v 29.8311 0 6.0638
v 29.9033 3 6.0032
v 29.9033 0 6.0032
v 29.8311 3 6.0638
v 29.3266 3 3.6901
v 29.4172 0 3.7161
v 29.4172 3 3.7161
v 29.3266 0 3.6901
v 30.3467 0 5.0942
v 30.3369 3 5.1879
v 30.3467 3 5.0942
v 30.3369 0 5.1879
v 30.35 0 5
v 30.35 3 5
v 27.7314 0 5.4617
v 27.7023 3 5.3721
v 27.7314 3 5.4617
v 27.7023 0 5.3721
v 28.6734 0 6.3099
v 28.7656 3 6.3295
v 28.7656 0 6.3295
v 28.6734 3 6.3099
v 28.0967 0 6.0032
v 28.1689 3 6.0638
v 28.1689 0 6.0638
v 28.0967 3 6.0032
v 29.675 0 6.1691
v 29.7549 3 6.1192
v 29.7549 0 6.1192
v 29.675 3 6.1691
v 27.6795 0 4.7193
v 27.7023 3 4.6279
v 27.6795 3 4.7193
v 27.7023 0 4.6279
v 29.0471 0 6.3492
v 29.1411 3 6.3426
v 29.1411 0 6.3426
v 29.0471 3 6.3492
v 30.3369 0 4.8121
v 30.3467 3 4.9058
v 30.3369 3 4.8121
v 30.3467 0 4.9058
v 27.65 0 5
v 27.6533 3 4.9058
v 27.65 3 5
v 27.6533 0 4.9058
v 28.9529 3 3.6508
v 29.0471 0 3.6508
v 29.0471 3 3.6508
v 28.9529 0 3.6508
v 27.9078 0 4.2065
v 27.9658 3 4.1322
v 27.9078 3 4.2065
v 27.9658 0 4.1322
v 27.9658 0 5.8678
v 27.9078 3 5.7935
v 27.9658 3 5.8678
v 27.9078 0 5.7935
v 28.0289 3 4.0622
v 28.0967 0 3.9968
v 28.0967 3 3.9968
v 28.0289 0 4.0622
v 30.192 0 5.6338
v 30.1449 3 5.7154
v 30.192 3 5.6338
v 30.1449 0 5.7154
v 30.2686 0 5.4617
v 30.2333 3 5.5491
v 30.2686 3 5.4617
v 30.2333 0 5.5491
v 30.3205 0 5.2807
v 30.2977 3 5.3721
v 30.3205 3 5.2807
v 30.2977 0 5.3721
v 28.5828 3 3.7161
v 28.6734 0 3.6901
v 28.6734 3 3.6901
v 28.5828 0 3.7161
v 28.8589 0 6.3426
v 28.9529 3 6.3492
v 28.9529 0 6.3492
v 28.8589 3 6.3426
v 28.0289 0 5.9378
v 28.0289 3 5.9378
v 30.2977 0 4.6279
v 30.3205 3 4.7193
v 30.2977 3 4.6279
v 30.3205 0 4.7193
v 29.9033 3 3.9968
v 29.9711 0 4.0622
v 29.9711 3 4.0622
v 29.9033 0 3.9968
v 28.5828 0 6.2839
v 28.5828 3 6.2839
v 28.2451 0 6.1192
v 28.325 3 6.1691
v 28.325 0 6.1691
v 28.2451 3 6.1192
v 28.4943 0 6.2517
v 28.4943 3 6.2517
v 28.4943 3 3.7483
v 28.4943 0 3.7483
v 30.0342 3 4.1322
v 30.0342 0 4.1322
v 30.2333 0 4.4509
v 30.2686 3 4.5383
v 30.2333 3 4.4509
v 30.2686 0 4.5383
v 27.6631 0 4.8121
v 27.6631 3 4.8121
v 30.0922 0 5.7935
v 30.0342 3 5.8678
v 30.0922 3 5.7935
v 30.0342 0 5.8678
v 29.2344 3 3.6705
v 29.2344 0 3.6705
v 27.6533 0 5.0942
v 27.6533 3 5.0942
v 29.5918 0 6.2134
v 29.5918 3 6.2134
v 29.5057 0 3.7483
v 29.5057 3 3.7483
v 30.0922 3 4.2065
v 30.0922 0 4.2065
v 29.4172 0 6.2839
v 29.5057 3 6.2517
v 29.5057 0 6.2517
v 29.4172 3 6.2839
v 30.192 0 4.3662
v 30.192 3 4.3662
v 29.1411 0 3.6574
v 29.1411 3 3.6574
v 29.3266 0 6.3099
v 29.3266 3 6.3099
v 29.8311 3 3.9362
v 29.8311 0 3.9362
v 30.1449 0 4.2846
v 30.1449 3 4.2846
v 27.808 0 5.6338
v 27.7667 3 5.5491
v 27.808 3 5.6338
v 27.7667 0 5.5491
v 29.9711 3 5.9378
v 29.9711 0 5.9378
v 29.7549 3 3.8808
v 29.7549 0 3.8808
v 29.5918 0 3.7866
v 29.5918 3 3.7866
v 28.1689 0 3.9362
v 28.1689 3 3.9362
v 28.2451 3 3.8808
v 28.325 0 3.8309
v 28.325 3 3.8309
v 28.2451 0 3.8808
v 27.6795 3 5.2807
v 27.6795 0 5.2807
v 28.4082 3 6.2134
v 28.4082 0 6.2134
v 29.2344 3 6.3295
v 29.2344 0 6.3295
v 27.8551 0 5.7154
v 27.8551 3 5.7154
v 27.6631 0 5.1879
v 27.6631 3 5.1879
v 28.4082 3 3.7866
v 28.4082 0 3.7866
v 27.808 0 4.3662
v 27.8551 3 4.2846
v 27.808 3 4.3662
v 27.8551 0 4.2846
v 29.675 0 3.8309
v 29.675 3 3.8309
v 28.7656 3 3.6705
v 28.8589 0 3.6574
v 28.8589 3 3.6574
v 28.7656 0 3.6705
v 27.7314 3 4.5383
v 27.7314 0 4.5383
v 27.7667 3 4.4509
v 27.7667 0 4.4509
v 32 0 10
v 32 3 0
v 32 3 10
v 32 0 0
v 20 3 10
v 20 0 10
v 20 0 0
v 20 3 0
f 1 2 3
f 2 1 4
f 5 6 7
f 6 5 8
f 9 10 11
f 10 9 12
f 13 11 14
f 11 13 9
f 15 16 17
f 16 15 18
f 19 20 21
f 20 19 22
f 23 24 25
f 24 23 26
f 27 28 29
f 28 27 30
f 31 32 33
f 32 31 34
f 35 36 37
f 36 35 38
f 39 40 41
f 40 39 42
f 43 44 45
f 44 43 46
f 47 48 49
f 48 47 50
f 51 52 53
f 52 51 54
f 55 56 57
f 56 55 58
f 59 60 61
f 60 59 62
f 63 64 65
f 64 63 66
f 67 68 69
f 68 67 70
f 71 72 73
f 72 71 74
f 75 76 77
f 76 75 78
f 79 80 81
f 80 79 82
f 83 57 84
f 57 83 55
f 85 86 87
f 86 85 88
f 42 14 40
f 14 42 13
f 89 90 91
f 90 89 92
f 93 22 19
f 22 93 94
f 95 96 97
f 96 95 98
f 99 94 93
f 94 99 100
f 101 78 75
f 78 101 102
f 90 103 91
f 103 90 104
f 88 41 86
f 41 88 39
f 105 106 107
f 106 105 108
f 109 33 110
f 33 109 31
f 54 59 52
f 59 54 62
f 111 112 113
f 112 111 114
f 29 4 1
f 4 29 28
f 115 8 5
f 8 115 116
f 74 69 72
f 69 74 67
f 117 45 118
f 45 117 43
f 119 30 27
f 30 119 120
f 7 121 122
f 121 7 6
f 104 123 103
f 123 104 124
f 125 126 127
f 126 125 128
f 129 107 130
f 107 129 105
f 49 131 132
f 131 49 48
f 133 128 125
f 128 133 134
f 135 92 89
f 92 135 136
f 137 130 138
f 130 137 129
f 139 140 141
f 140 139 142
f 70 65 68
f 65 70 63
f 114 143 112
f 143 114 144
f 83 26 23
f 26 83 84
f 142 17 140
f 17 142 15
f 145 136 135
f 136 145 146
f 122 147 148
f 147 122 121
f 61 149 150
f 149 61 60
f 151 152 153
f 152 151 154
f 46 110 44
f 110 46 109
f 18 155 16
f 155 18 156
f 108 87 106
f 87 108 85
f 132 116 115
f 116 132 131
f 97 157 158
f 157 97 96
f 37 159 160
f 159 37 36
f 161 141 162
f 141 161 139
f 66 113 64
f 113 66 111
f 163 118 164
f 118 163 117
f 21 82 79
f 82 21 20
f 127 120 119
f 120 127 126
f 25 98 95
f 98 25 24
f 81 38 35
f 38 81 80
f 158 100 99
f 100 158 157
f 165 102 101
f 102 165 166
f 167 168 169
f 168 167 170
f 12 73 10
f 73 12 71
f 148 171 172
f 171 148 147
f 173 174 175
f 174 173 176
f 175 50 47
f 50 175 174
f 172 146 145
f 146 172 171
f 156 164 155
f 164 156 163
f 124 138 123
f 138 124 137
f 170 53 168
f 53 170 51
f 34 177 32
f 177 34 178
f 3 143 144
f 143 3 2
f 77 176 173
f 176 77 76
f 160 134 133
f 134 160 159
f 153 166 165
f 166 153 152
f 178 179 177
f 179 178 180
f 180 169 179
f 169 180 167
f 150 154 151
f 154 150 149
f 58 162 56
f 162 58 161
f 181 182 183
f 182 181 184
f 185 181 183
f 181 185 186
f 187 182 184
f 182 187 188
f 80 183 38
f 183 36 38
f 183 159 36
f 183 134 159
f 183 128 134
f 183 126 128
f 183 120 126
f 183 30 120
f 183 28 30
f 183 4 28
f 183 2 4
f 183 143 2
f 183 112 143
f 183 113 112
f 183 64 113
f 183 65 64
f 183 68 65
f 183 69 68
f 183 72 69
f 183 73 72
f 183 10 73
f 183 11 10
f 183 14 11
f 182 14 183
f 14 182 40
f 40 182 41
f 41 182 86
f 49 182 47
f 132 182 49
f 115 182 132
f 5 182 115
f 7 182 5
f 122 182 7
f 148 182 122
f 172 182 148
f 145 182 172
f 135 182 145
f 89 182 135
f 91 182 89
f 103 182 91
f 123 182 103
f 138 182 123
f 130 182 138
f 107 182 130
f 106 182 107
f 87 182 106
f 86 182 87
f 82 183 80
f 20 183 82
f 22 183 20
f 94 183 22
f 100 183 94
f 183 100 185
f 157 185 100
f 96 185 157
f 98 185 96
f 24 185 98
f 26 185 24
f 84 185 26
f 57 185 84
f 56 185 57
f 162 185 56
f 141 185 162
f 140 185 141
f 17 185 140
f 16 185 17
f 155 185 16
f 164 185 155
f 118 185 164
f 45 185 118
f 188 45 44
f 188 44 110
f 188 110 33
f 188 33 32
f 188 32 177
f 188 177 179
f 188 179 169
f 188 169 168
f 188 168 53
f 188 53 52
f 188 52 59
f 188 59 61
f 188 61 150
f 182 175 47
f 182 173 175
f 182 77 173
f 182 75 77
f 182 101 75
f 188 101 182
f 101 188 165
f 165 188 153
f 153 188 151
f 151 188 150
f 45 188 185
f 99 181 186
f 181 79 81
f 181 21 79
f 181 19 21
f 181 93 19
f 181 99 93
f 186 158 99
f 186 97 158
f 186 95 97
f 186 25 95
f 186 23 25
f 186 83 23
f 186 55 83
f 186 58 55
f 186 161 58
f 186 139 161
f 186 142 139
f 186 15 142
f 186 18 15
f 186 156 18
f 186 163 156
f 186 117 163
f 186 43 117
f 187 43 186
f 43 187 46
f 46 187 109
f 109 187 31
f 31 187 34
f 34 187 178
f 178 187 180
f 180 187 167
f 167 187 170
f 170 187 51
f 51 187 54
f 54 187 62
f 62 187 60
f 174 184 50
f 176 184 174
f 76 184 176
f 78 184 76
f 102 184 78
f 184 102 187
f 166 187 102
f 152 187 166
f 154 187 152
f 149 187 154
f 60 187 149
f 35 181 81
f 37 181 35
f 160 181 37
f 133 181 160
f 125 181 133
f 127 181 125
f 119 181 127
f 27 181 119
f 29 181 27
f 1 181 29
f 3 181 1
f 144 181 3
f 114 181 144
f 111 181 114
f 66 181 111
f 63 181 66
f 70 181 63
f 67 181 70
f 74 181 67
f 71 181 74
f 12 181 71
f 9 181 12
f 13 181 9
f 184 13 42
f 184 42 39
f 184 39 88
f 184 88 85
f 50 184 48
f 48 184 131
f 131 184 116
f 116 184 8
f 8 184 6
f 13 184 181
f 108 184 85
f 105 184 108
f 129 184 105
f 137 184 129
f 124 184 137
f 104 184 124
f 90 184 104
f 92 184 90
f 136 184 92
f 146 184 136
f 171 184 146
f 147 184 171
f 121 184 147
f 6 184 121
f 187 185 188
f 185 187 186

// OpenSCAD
// file: modules.scad
include<consts.scad>; //include gloabal vars

module sqrSupport(w, l) {
    cube([w, l, sqrSupportH]);
}

module triSupport() {
    difference(){
        //creating a cube
        cube([TRI_SUPPORT_W, TRI_SUPPORT_L, sqrSupportH]);
        //rotating the cube
        translate([-1, TRI_SUPPORT_L, -1]) rotate([TRI_SUPPORT_ANGLE, 0, 0]) cube([10, 20, 25]);
    }
}


//For 2s 18650 holders. Lots of space between them.
module batHoles(x) {
    rotate([0, 0, 90]) {
        translate([-w/2+51.25, x, -25]) m3Hole();
        translate([-w/2+51.25, x+BAT_HOLES_DISTANCE, -25]) m3Hole();
    }
}


//Holes to mount door hinges (70mm x 50mm or somethin')
module doorHinge(x) {
   rotate([90, 0, 0]) {
      translate([0, h/2-10.5 , -w/2-20]) {
        translate([x, 2.5, 0]) m3Hole();
        translate([x+25, 0, 0]) m3Hole();
        translate([x+50, 2.5, 0]) m3Hole();
       }
    }
}





module hinge(x) {
   rotate([90, 0, 0]) {
      translate([0, h/2-10.5 , -w/2-20]) {
        translate([x, 2.5, 0]) m4Hole();
        translate([x+36, 2.5, 0]) m4Hole();
       }
    }
}

module smallHinge(x) {
	rotate([90, 0, 0]) {
		translate([0, h/2-10.5, -w/2-20]) {
			translate([x, 2.5, 0]) m4Hole();
			translate([x+26, 2.5, 0]) m4Hole();
		}
	}
}
//M3 Hole. 1.85mm radius for telerance.
//Drill the pi w/m3 drill bit to widen annoying m2.5 hole
module m3Hole() {
     cylinder(30, 1.85, 1.85);
}

//Used for air intakes only
//Hexagonal for coolness factor
module largeIntake() {
    cylinder(25, largeIntakeRadius, largeIntakeRadius, $fn = 6);
}
module m4Hole() {
     cylinder(25, 2.2, 2.2);
}

module bigFeckingHole() {
     cylinder(1.5, 3.3, 3.3);
}

module m2Hole() {
     cylinder(10, 1.35, 1.35);
}


//For pico
module m2Holder() {
    cylinder(4.25, 3, 3);
    cylinder(6.25, 0.875, 0.875);
}

//Designed to support KB+TP & M3 heatpress threaded inserts.
module cornerSqr(x, y) {
        difference() {
            translate([x, y, SURFACE_MOUNT]) cube([12, 12, h+3-keyboardPlateW]);
            translate([x+6,y+6, 30]) cylinder(49, HEATSET_INSERT_HOLE, HEATSET_INSERT_HOLE, center=true);
        }
}

module m3Extrude() {
    difference() {
        bigFeckingHole();
        translate([0, 0, -1]) m3Hole();
    }
}


module iecCornerTriangle() {
        difference() {
            rotate([0,0,90]) cube([IEC_CORNER_TRIANGLE_SIZE, 3, IEC_CORNER_TRIANGLE_SIZE]);
            //Translate to stoep z-fighting
            rotate([0,315, 90]) translate([0,-1,0])  cube([IEC_CORNER_TRIANGLE_SIZE*2, 5, IEC_CORNER_TRIANGLE_SIZE]);
        }
}

//provide a strong connection from hinge to lid
module hingeMountPoint()
{
	difference()
	{
		minkowski()
		{
			translate([0, -w/2+4.5, 0]) cube([42, 6, 2.5]);
			cylinder(0.000000000001, 3, 3);
		}
		translate([39, -w/2+7, -1]) m4Hole();
		translate([3, -w/2+7, -1]) m4Hole();

	}
}

module smallHingeMountPoint()
{
	difference()
	{
		minkowski()
		{
			translate([0, -w/2+4.5, 0]) cube([32, 6, 2.5]);
			cylinder(0.000000000000001, 3, 3);
		}
		translate([29, -w/2+7, -1]) m4Hole();
		translate([3, -w/2+7, -1]) m4Hole();

	}

}

//m4 screw holes for hinge on the lid
module lidHinge(x) {
    translate([0, -w/2+4.5, -5]) {
        translate([x, 2.5, 0]) {
            m4Hole();
        }
        translate([x+36, 2.5, 0]) {
            m4Hole();
        }
     }
}

module smallLidHinge(x) {
    translate([0, -w/2+4.5, -5]) {
        translate([x, 2.5, 0]) m4Hole();
        translate([x+26, 2.5, 0]) m4Hole();
     }
}


module bulbHolder()
{
	difference()
	{
		cube([BULB_HOLDER_W, 5, BULB_HOLDER_H]);
		rotate([90, 0, 0])
		{
			translate([4, BULB_HOLDER_H/1.5, -6])
			{
				m2Hole();
				translate([BULB_HOLES_DIST, 0, 0]) m2Hole();
			}
		}
		translate([BULB_HOLDER_W/2, 0, 0]) cube([17.5, 5*10, BULB_HOLDER_H*4], center = true);

	}
}

//mounting holes for IPS panel
module screenMountHoles()
{
	translate([0,0,0])
	{
		translate([-124.75,0,0]) m2Hole();
		translate([124.75,0,0]) m2Hole();
	}
	translate([0, 192, 0])
	{
		translate([-138.5,0,0]) m2Hole();
		translate([138.5,0,0]) m2Hole();
	}

}
// file: consts.scad
l = 340;
w = 220;
h = 22;

//enable if using offical rasbPi5 cooler or using the pcb mount holes.
OFFICAL_PI_5_COOLER = false;
PI_4_ETHERNET = false; //what side the rj-45 port of the sbc is on


LAPTOP_NORTH = w/2;
LAPTOP_SOUTH = -w/2;
LAPTOP_EAST = l/2;
LAPTOP_WEETBIX = -l/2;

SURFACE_MOUNT = -h/2;

//The size of the cutout for the PSU plate
PSU_HOLE_L= 114;
PSU_HOLE_W = 52;

//IEC AC connecter
IEC_W = 27.5;
IEC_H = 16.5;
IEC_HOLES_DISTANCE = 40;

IEC_Y = w/2-54.5;

IEC_CORNER_TRIANGLE_SIZE = 5;


//Square supports prevent the walls from flexing
sqrSupportW = 5;
SQR_SUPPORT_L = 12;
LARGE_SQR_SUPPORT_W = 15;

TRI_SUPPORT_W = 6.5;
TRI_SUPPORT_L = 15;
TRI_SUPPORT_ANGLE = 20;

//Cutout for pi I/O
piCutoutX = 52.5;
piCutoutY = 16.70;

PI_CUTOUT_ADDON_W = 19.5;
PI_CUTOUT_ADDON_H = 2.5;

//The thing that lets me screw the halves together
connecterW = 10;


BMS_X = 18;
BMS_Y = -11;


BMS_L = 56;
BMS_W = 28.7;


buckW = 20.5;
buckL = 25.5;

picoW = 50;
picoL = 20;

picoX = 100;
picoY = -39;

//3s bat holder
BAT_W = 61;
BAT_H = 76 ;

BAT_HOLES_DISTANCE = 40;
BAT_X_OFFSET = 30;

//How thick the kb + tp plate will be
keyboardPlateW = 2;

sqrSupportZ = -h/3-keyboardPlateW;
sqrSupportH = 21;

largeIntakeRadius = 4.65;
smallIntakeRadius = 0;

HEATSET_INSERT_HOLE = 2.1; //the pilot hole for M3 heatpress inserts

LARGE_INTAKE_R = 4.65;

HINGE_AX = -143;
HINGE_BX = 25;
HINGE_CX = -50;

BULB_HOLDER_W = 33;
BULB_HOLDER_H = 12;
BULB_HOLES_DIST = 25;
// main file
$fn = 90;

include<consts.scad>;
include<modules.scad>;

bulbHolder();

BULB_HOLDER_W = 32;
BULB_HOLDER_H = 10;
BULB_HOLES_DIST = 25;

module bulbHolder()
{
	difference()
	{
		cube([BULB_HOLDER_W, 3, BULB_HOLDER_H]);
		rotate([90, 0, 0])
		{
			translate([4, BULB_HOLDER_H/2, -4])
			{
				m2Hole();
				translate([BULB_HOLES_DIST, 0, 0]) m2Hole();
			}
		}
		cube([20, 5, 20]);

	}
}
